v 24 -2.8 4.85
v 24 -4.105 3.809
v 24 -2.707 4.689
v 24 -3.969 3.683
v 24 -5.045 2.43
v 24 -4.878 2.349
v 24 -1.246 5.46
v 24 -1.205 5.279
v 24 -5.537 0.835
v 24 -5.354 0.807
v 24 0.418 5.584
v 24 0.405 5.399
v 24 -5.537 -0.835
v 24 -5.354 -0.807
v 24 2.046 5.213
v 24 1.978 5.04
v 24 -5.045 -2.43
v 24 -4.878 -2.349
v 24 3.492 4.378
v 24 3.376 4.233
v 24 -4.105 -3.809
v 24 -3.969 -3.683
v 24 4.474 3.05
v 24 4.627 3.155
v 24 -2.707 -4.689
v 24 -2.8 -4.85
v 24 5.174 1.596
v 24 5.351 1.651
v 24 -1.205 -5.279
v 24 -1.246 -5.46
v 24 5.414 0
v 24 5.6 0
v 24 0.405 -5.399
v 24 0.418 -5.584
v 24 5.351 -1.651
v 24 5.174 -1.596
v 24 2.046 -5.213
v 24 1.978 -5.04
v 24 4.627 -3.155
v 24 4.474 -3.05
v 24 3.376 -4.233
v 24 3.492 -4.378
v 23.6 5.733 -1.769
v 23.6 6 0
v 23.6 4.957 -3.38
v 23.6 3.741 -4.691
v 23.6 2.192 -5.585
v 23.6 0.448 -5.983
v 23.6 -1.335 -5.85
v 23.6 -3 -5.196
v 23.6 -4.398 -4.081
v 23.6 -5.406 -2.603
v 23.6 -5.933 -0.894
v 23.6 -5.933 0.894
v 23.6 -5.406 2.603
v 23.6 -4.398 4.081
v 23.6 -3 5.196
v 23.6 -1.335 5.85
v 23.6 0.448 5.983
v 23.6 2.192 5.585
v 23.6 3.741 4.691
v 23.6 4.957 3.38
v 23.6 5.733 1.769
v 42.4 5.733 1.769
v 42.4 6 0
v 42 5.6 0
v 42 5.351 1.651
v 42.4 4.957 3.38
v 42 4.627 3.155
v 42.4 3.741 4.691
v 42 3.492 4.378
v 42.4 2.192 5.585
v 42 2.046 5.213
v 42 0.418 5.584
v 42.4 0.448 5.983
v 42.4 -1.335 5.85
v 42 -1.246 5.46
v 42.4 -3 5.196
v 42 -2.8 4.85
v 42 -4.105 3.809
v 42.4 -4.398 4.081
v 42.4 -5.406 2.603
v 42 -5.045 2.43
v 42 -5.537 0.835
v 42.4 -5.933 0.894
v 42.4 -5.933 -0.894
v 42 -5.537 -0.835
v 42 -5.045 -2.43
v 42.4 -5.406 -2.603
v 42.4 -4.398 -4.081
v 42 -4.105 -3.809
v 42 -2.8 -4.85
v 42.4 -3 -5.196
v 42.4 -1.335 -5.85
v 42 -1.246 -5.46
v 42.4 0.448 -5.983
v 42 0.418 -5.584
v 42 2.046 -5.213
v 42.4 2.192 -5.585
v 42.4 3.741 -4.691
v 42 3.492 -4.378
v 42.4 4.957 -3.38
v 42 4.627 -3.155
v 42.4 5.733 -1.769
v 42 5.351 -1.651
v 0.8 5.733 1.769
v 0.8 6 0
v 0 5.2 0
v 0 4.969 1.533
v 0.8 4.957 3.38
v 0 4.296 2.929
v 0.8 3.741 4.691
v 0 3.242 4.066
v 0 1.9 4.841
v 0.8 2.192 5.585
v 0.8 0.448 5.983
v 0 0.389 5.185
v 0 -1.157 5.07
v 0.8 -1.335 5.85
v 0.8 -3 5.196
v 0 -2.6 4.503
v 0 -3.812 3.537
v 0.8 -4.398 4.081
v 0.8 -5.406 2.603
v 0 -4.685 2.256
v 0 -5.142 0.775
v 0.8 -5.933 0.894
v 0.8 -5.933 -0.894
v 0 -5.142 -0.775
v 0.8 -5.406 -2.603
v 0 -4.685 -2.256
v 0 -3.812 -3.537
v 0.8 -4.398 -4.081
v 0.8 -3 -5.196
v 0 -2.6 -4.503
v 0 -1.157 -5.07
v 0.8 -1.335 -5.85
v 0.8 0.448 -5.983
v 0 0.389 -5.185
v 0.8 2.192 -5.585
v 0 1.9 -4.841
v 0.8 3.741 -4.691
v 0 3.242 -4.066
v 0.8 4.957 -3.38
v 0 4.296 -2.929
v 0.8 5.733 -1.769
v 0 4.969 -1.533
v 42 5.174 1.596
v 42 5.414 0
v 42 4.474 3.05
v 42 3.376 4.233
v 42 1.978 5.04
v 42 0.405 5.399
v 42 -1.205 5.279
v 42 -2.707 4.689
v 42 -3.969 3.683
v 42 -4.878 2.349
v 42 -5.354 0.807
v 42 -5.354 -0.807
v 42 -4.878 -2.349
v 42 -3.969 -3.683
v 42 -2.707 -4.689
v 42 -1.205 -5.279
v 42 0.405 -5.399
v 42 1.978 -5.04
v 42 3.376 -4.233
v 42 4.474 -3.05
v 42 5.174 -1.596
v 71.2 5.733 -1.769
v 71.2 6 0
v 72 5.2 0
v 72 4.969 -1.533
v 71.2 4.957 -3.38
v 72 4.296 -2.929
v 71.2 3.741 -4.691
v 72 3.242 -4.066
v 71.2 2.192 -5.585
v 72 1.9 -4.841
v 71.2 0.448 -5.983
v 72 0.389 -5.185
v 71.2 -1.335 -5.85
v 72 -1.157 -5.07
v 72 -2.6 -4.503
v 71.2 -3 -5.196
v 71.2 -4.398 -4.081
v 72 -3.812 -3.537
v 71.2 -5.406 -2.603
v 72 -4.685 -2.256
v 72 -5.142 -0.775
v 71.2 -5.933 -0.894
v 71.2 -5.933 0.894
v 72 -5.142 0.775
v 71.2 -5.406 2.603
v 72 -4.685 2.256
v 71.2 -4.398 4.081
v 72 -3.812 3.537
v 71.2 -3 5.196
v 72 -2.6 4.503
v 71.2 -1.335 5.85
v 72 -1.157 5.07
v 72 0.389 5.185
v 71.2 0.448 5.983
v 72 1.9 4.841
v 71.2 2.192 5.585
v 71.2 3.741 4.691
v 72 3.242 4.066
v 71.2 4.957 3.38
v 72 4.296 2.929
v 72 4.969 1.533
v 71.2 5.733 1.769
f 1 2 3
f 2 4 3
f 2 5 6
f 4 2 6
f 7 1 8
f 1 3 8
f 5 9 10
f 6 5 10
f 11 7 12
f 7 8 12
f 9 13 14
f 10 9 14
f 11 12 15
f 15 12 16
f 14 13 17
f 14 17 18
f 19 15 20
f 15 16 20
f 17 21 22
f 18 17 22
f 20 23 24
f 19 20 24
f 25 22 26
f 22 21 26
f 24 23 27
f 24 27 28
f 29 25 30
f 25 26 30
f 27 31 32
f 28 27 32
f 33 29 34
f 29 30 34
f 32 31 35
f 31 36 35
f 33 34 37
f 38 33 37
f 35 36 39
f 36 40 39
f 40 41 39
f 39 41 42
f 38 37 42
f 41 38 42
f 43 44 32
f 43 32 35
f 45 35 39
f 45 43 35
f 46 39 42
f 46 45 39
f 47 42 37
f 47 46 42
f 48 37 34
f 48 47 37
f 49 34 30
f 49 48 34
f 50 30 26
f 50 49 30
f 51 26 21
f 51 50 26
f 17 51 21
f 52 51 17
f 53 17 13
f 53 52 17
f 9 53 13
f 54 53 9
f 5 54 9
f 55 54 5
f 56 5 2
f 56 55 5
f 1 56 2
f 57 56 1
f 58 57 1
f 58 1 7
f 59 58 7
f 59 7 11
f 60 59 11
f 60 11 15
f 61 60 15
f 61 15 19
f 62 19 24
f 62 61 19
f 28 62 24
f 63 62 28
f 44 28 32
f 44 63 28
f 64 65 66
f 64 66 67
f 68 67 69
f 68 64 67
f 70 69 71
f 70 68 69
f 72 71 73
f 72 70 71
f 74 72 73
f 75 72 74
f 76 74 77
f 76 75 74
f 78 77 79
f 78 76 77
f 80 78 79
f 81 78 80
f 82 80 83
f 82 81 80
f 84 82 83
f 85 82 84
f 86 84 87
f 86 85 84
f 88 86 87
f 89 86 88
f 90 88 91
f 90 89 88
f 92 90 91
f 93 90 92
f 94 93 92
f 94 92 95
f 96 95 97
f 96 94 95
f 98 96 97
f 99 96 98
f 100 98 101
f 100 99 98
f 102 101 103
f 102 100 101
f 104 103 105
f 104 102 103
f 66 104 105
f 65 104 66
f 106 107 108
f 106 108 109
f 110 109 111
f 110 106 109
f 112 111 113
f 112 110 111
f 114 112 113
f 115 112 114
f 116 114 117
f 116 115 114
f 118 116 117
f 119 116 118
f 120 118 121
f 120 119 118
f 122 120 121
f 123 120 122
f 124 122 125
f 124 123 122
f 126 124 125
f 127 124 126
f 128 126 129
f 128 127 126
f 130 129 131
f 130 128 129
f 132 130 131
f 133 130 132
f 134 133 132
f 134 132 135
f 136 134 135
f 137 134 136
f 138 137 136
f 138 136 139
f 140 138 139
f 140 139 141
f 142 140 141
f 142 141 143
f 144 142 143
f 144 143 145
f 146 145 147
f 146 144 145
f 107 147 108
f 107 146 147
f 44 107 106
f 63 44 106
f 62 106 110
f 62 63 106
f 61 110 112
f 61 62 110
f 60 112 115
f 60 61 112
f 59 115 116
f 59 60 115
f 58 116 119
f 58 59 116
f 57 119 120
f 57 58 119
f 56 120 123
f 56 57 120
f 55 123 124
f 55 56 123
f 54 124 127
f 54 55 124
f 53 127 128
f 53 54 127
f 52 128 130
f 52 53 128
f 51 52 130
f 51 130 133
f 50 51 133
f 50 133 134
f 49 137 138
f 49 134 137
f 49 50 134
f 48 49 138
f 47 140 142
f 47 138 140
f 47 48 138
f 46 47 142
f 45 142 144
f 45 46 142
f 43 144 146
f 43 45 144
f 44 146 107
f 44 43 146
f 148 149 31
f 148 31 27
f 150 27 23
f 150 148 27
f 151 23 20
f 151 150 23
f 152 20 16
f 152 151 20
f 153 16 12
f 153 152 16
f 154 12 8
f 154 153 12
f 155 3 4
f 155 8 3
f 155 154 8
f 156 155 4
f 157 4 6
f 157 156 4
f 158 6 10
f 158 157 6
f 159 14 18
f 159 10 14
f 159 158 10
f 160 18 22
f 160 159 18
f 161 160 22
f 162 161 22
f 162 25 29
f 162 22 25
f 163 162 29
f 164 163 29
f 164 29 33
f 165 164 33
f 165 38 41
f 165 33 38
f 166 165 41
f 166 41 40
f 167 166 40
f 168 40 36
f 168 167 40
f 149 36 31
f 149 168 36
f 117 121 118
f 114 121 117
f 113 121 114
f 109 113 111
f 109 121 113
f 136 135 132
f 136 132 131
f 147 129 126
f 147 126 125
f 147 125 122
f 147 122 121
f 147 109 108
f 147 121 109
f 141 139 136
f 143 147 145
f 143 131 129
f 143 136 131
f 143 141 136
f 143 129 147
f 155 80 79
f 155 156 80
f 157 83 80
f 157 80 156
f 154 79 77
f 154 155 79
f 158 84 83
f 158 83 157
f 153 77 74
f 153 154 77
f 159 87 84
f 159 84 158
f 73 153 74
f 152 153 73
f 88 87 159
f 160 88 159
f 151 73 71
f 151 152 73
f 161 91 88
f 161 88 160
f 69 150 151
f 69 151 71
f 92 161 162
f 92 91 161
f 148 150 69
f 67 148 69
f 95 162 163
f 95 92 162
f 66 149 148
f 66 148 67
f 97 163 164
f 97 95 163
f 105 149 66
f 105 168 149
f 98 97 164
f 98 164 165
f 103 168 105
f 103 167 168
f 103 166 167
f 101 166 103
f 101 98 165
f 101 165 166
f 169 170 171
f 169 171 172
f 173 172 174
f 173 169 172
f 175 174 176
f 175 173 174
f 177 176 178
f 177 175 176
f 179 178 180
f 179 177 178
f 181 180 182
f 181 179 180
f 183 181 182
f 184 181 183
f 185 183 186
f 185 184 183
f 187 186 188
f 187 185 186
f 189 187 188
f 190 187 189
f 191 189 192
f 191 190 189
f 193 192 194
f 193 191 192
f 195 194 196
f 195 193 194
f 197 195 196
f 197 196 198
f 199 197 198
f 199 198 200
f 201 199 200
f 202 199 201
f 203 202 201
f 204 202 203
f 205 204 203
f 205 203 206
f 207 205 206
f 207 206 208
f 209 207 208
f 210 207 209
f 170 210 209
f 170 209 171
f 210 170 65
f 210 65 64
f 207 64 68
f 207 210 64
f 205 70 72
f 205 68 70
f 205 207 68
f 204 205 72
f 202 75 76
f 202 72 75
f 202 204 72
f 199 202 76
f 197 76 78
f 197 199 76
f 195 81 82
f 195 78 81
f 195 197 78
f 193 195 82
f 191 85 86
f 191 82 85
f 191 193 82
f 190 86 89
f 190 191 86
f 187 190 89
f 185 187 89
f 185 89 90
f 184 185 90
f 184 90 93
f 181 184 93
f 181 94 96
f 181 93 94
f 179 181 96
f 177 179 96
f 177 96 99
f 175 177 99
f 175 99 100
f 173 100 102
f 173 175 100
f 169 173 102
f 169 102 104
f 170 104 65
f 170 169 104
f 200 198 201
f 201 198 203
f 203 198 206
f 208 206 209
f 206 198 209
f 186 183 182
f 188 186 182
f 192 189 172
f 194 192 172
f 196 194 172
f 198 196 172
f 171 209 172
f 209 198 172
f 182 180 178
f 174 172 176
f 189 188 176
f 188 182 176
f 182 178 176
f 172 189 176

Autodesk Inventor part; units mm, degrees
ref_plane "YZ Plane" through (0, 0, 0) normal (1, 0, 0) x (0, 1, 0)
ref_plane "XZ Plane" through (0, 0, 0) normal (0, 1, 0) x (-1, 0, 0)
sketch "Sketch1" plane through (0, 0, 0) normal (0, 0, 1) x (1, 0, 0)
  line L0 (0, 0) -> (0, 6)
  line L1 (0, 6) -> (24, 6)
  line L2 (24, 6) -> (24, 5.4145)
  line L3 (24, 5.4145) -> (42, 5.4145)
  line L4 (42, 5.4145) -> (42, 6)
  line L5 (42, 6) -> (72, 6)
  line L6 (72, 6) -> (72, 0)
  line L7 (72, 0) -> (0, 0)
  dimension "d1" = 12
  dimension "d3" = 10.829
  dimension "d4" = 24
  dimension "d5" = 48
  dimension "d6" = 30
revolve "Вращение1" add sketch "Sketch1" angle 360 about axis through (72, 0, 0) along (-1, 0, 0)
thread "Резьба1" size "M12x1.75" class "6g" standard "ISO Metric profile" length 24
thread "Резьба2" size "M12x1.75" class "6g" standard "ISO Metric profile" length 30
chamfer "Фаска1" distance 0.8 angle 45 2 edges at (0, -6, 0) (72, -6, 0)
chamfer "Фаска2" distance 0.4 angle 45 2 edges at (24, -6, 0) (42, -6, 0)
ref_plane "Work Plane1" through (24, 0, 0) normal (1, 0, 0) x (0, 1, 0)
sketch "Sketch2" plane through (24, 0, 0) normal (1, 0, 0) x (0, 1, 0)
  circle A0 centre (0, 0) radius 6
  point P0 (0, 0)
  dimension "d35" = 12
boundary_patch "Участок поверхности1"
equation "\"d8\" = d4"
equation "\"d29\" = b"
equation "\"d31\" = C_"
equation "\"d37\" = C2_"
equation "\"d1\" = d"
equation "\"d3\" = d2"
equation "\"d4\" = b1"
equation "\"d5\" = L"
equation "\"d6\" = b"
equation "\"d35\" = d"
equation "\"C_\" = 0.8"
equation "\"d\" = 12"
equation "\"d2\" = 10.829"
equation "\"b1\" = 24"
equation "\"L\" = 48"
equation "\"b\" = 30"
equation "\"d34\" = -b1"
equation "\"C2_\" = 0.4"
equation "\"Grip_Length\" = 18"
properties part number "Шпилька 2 M12-6g×48 ГОСТ 22038-76" material "Сталь, мягкая"
